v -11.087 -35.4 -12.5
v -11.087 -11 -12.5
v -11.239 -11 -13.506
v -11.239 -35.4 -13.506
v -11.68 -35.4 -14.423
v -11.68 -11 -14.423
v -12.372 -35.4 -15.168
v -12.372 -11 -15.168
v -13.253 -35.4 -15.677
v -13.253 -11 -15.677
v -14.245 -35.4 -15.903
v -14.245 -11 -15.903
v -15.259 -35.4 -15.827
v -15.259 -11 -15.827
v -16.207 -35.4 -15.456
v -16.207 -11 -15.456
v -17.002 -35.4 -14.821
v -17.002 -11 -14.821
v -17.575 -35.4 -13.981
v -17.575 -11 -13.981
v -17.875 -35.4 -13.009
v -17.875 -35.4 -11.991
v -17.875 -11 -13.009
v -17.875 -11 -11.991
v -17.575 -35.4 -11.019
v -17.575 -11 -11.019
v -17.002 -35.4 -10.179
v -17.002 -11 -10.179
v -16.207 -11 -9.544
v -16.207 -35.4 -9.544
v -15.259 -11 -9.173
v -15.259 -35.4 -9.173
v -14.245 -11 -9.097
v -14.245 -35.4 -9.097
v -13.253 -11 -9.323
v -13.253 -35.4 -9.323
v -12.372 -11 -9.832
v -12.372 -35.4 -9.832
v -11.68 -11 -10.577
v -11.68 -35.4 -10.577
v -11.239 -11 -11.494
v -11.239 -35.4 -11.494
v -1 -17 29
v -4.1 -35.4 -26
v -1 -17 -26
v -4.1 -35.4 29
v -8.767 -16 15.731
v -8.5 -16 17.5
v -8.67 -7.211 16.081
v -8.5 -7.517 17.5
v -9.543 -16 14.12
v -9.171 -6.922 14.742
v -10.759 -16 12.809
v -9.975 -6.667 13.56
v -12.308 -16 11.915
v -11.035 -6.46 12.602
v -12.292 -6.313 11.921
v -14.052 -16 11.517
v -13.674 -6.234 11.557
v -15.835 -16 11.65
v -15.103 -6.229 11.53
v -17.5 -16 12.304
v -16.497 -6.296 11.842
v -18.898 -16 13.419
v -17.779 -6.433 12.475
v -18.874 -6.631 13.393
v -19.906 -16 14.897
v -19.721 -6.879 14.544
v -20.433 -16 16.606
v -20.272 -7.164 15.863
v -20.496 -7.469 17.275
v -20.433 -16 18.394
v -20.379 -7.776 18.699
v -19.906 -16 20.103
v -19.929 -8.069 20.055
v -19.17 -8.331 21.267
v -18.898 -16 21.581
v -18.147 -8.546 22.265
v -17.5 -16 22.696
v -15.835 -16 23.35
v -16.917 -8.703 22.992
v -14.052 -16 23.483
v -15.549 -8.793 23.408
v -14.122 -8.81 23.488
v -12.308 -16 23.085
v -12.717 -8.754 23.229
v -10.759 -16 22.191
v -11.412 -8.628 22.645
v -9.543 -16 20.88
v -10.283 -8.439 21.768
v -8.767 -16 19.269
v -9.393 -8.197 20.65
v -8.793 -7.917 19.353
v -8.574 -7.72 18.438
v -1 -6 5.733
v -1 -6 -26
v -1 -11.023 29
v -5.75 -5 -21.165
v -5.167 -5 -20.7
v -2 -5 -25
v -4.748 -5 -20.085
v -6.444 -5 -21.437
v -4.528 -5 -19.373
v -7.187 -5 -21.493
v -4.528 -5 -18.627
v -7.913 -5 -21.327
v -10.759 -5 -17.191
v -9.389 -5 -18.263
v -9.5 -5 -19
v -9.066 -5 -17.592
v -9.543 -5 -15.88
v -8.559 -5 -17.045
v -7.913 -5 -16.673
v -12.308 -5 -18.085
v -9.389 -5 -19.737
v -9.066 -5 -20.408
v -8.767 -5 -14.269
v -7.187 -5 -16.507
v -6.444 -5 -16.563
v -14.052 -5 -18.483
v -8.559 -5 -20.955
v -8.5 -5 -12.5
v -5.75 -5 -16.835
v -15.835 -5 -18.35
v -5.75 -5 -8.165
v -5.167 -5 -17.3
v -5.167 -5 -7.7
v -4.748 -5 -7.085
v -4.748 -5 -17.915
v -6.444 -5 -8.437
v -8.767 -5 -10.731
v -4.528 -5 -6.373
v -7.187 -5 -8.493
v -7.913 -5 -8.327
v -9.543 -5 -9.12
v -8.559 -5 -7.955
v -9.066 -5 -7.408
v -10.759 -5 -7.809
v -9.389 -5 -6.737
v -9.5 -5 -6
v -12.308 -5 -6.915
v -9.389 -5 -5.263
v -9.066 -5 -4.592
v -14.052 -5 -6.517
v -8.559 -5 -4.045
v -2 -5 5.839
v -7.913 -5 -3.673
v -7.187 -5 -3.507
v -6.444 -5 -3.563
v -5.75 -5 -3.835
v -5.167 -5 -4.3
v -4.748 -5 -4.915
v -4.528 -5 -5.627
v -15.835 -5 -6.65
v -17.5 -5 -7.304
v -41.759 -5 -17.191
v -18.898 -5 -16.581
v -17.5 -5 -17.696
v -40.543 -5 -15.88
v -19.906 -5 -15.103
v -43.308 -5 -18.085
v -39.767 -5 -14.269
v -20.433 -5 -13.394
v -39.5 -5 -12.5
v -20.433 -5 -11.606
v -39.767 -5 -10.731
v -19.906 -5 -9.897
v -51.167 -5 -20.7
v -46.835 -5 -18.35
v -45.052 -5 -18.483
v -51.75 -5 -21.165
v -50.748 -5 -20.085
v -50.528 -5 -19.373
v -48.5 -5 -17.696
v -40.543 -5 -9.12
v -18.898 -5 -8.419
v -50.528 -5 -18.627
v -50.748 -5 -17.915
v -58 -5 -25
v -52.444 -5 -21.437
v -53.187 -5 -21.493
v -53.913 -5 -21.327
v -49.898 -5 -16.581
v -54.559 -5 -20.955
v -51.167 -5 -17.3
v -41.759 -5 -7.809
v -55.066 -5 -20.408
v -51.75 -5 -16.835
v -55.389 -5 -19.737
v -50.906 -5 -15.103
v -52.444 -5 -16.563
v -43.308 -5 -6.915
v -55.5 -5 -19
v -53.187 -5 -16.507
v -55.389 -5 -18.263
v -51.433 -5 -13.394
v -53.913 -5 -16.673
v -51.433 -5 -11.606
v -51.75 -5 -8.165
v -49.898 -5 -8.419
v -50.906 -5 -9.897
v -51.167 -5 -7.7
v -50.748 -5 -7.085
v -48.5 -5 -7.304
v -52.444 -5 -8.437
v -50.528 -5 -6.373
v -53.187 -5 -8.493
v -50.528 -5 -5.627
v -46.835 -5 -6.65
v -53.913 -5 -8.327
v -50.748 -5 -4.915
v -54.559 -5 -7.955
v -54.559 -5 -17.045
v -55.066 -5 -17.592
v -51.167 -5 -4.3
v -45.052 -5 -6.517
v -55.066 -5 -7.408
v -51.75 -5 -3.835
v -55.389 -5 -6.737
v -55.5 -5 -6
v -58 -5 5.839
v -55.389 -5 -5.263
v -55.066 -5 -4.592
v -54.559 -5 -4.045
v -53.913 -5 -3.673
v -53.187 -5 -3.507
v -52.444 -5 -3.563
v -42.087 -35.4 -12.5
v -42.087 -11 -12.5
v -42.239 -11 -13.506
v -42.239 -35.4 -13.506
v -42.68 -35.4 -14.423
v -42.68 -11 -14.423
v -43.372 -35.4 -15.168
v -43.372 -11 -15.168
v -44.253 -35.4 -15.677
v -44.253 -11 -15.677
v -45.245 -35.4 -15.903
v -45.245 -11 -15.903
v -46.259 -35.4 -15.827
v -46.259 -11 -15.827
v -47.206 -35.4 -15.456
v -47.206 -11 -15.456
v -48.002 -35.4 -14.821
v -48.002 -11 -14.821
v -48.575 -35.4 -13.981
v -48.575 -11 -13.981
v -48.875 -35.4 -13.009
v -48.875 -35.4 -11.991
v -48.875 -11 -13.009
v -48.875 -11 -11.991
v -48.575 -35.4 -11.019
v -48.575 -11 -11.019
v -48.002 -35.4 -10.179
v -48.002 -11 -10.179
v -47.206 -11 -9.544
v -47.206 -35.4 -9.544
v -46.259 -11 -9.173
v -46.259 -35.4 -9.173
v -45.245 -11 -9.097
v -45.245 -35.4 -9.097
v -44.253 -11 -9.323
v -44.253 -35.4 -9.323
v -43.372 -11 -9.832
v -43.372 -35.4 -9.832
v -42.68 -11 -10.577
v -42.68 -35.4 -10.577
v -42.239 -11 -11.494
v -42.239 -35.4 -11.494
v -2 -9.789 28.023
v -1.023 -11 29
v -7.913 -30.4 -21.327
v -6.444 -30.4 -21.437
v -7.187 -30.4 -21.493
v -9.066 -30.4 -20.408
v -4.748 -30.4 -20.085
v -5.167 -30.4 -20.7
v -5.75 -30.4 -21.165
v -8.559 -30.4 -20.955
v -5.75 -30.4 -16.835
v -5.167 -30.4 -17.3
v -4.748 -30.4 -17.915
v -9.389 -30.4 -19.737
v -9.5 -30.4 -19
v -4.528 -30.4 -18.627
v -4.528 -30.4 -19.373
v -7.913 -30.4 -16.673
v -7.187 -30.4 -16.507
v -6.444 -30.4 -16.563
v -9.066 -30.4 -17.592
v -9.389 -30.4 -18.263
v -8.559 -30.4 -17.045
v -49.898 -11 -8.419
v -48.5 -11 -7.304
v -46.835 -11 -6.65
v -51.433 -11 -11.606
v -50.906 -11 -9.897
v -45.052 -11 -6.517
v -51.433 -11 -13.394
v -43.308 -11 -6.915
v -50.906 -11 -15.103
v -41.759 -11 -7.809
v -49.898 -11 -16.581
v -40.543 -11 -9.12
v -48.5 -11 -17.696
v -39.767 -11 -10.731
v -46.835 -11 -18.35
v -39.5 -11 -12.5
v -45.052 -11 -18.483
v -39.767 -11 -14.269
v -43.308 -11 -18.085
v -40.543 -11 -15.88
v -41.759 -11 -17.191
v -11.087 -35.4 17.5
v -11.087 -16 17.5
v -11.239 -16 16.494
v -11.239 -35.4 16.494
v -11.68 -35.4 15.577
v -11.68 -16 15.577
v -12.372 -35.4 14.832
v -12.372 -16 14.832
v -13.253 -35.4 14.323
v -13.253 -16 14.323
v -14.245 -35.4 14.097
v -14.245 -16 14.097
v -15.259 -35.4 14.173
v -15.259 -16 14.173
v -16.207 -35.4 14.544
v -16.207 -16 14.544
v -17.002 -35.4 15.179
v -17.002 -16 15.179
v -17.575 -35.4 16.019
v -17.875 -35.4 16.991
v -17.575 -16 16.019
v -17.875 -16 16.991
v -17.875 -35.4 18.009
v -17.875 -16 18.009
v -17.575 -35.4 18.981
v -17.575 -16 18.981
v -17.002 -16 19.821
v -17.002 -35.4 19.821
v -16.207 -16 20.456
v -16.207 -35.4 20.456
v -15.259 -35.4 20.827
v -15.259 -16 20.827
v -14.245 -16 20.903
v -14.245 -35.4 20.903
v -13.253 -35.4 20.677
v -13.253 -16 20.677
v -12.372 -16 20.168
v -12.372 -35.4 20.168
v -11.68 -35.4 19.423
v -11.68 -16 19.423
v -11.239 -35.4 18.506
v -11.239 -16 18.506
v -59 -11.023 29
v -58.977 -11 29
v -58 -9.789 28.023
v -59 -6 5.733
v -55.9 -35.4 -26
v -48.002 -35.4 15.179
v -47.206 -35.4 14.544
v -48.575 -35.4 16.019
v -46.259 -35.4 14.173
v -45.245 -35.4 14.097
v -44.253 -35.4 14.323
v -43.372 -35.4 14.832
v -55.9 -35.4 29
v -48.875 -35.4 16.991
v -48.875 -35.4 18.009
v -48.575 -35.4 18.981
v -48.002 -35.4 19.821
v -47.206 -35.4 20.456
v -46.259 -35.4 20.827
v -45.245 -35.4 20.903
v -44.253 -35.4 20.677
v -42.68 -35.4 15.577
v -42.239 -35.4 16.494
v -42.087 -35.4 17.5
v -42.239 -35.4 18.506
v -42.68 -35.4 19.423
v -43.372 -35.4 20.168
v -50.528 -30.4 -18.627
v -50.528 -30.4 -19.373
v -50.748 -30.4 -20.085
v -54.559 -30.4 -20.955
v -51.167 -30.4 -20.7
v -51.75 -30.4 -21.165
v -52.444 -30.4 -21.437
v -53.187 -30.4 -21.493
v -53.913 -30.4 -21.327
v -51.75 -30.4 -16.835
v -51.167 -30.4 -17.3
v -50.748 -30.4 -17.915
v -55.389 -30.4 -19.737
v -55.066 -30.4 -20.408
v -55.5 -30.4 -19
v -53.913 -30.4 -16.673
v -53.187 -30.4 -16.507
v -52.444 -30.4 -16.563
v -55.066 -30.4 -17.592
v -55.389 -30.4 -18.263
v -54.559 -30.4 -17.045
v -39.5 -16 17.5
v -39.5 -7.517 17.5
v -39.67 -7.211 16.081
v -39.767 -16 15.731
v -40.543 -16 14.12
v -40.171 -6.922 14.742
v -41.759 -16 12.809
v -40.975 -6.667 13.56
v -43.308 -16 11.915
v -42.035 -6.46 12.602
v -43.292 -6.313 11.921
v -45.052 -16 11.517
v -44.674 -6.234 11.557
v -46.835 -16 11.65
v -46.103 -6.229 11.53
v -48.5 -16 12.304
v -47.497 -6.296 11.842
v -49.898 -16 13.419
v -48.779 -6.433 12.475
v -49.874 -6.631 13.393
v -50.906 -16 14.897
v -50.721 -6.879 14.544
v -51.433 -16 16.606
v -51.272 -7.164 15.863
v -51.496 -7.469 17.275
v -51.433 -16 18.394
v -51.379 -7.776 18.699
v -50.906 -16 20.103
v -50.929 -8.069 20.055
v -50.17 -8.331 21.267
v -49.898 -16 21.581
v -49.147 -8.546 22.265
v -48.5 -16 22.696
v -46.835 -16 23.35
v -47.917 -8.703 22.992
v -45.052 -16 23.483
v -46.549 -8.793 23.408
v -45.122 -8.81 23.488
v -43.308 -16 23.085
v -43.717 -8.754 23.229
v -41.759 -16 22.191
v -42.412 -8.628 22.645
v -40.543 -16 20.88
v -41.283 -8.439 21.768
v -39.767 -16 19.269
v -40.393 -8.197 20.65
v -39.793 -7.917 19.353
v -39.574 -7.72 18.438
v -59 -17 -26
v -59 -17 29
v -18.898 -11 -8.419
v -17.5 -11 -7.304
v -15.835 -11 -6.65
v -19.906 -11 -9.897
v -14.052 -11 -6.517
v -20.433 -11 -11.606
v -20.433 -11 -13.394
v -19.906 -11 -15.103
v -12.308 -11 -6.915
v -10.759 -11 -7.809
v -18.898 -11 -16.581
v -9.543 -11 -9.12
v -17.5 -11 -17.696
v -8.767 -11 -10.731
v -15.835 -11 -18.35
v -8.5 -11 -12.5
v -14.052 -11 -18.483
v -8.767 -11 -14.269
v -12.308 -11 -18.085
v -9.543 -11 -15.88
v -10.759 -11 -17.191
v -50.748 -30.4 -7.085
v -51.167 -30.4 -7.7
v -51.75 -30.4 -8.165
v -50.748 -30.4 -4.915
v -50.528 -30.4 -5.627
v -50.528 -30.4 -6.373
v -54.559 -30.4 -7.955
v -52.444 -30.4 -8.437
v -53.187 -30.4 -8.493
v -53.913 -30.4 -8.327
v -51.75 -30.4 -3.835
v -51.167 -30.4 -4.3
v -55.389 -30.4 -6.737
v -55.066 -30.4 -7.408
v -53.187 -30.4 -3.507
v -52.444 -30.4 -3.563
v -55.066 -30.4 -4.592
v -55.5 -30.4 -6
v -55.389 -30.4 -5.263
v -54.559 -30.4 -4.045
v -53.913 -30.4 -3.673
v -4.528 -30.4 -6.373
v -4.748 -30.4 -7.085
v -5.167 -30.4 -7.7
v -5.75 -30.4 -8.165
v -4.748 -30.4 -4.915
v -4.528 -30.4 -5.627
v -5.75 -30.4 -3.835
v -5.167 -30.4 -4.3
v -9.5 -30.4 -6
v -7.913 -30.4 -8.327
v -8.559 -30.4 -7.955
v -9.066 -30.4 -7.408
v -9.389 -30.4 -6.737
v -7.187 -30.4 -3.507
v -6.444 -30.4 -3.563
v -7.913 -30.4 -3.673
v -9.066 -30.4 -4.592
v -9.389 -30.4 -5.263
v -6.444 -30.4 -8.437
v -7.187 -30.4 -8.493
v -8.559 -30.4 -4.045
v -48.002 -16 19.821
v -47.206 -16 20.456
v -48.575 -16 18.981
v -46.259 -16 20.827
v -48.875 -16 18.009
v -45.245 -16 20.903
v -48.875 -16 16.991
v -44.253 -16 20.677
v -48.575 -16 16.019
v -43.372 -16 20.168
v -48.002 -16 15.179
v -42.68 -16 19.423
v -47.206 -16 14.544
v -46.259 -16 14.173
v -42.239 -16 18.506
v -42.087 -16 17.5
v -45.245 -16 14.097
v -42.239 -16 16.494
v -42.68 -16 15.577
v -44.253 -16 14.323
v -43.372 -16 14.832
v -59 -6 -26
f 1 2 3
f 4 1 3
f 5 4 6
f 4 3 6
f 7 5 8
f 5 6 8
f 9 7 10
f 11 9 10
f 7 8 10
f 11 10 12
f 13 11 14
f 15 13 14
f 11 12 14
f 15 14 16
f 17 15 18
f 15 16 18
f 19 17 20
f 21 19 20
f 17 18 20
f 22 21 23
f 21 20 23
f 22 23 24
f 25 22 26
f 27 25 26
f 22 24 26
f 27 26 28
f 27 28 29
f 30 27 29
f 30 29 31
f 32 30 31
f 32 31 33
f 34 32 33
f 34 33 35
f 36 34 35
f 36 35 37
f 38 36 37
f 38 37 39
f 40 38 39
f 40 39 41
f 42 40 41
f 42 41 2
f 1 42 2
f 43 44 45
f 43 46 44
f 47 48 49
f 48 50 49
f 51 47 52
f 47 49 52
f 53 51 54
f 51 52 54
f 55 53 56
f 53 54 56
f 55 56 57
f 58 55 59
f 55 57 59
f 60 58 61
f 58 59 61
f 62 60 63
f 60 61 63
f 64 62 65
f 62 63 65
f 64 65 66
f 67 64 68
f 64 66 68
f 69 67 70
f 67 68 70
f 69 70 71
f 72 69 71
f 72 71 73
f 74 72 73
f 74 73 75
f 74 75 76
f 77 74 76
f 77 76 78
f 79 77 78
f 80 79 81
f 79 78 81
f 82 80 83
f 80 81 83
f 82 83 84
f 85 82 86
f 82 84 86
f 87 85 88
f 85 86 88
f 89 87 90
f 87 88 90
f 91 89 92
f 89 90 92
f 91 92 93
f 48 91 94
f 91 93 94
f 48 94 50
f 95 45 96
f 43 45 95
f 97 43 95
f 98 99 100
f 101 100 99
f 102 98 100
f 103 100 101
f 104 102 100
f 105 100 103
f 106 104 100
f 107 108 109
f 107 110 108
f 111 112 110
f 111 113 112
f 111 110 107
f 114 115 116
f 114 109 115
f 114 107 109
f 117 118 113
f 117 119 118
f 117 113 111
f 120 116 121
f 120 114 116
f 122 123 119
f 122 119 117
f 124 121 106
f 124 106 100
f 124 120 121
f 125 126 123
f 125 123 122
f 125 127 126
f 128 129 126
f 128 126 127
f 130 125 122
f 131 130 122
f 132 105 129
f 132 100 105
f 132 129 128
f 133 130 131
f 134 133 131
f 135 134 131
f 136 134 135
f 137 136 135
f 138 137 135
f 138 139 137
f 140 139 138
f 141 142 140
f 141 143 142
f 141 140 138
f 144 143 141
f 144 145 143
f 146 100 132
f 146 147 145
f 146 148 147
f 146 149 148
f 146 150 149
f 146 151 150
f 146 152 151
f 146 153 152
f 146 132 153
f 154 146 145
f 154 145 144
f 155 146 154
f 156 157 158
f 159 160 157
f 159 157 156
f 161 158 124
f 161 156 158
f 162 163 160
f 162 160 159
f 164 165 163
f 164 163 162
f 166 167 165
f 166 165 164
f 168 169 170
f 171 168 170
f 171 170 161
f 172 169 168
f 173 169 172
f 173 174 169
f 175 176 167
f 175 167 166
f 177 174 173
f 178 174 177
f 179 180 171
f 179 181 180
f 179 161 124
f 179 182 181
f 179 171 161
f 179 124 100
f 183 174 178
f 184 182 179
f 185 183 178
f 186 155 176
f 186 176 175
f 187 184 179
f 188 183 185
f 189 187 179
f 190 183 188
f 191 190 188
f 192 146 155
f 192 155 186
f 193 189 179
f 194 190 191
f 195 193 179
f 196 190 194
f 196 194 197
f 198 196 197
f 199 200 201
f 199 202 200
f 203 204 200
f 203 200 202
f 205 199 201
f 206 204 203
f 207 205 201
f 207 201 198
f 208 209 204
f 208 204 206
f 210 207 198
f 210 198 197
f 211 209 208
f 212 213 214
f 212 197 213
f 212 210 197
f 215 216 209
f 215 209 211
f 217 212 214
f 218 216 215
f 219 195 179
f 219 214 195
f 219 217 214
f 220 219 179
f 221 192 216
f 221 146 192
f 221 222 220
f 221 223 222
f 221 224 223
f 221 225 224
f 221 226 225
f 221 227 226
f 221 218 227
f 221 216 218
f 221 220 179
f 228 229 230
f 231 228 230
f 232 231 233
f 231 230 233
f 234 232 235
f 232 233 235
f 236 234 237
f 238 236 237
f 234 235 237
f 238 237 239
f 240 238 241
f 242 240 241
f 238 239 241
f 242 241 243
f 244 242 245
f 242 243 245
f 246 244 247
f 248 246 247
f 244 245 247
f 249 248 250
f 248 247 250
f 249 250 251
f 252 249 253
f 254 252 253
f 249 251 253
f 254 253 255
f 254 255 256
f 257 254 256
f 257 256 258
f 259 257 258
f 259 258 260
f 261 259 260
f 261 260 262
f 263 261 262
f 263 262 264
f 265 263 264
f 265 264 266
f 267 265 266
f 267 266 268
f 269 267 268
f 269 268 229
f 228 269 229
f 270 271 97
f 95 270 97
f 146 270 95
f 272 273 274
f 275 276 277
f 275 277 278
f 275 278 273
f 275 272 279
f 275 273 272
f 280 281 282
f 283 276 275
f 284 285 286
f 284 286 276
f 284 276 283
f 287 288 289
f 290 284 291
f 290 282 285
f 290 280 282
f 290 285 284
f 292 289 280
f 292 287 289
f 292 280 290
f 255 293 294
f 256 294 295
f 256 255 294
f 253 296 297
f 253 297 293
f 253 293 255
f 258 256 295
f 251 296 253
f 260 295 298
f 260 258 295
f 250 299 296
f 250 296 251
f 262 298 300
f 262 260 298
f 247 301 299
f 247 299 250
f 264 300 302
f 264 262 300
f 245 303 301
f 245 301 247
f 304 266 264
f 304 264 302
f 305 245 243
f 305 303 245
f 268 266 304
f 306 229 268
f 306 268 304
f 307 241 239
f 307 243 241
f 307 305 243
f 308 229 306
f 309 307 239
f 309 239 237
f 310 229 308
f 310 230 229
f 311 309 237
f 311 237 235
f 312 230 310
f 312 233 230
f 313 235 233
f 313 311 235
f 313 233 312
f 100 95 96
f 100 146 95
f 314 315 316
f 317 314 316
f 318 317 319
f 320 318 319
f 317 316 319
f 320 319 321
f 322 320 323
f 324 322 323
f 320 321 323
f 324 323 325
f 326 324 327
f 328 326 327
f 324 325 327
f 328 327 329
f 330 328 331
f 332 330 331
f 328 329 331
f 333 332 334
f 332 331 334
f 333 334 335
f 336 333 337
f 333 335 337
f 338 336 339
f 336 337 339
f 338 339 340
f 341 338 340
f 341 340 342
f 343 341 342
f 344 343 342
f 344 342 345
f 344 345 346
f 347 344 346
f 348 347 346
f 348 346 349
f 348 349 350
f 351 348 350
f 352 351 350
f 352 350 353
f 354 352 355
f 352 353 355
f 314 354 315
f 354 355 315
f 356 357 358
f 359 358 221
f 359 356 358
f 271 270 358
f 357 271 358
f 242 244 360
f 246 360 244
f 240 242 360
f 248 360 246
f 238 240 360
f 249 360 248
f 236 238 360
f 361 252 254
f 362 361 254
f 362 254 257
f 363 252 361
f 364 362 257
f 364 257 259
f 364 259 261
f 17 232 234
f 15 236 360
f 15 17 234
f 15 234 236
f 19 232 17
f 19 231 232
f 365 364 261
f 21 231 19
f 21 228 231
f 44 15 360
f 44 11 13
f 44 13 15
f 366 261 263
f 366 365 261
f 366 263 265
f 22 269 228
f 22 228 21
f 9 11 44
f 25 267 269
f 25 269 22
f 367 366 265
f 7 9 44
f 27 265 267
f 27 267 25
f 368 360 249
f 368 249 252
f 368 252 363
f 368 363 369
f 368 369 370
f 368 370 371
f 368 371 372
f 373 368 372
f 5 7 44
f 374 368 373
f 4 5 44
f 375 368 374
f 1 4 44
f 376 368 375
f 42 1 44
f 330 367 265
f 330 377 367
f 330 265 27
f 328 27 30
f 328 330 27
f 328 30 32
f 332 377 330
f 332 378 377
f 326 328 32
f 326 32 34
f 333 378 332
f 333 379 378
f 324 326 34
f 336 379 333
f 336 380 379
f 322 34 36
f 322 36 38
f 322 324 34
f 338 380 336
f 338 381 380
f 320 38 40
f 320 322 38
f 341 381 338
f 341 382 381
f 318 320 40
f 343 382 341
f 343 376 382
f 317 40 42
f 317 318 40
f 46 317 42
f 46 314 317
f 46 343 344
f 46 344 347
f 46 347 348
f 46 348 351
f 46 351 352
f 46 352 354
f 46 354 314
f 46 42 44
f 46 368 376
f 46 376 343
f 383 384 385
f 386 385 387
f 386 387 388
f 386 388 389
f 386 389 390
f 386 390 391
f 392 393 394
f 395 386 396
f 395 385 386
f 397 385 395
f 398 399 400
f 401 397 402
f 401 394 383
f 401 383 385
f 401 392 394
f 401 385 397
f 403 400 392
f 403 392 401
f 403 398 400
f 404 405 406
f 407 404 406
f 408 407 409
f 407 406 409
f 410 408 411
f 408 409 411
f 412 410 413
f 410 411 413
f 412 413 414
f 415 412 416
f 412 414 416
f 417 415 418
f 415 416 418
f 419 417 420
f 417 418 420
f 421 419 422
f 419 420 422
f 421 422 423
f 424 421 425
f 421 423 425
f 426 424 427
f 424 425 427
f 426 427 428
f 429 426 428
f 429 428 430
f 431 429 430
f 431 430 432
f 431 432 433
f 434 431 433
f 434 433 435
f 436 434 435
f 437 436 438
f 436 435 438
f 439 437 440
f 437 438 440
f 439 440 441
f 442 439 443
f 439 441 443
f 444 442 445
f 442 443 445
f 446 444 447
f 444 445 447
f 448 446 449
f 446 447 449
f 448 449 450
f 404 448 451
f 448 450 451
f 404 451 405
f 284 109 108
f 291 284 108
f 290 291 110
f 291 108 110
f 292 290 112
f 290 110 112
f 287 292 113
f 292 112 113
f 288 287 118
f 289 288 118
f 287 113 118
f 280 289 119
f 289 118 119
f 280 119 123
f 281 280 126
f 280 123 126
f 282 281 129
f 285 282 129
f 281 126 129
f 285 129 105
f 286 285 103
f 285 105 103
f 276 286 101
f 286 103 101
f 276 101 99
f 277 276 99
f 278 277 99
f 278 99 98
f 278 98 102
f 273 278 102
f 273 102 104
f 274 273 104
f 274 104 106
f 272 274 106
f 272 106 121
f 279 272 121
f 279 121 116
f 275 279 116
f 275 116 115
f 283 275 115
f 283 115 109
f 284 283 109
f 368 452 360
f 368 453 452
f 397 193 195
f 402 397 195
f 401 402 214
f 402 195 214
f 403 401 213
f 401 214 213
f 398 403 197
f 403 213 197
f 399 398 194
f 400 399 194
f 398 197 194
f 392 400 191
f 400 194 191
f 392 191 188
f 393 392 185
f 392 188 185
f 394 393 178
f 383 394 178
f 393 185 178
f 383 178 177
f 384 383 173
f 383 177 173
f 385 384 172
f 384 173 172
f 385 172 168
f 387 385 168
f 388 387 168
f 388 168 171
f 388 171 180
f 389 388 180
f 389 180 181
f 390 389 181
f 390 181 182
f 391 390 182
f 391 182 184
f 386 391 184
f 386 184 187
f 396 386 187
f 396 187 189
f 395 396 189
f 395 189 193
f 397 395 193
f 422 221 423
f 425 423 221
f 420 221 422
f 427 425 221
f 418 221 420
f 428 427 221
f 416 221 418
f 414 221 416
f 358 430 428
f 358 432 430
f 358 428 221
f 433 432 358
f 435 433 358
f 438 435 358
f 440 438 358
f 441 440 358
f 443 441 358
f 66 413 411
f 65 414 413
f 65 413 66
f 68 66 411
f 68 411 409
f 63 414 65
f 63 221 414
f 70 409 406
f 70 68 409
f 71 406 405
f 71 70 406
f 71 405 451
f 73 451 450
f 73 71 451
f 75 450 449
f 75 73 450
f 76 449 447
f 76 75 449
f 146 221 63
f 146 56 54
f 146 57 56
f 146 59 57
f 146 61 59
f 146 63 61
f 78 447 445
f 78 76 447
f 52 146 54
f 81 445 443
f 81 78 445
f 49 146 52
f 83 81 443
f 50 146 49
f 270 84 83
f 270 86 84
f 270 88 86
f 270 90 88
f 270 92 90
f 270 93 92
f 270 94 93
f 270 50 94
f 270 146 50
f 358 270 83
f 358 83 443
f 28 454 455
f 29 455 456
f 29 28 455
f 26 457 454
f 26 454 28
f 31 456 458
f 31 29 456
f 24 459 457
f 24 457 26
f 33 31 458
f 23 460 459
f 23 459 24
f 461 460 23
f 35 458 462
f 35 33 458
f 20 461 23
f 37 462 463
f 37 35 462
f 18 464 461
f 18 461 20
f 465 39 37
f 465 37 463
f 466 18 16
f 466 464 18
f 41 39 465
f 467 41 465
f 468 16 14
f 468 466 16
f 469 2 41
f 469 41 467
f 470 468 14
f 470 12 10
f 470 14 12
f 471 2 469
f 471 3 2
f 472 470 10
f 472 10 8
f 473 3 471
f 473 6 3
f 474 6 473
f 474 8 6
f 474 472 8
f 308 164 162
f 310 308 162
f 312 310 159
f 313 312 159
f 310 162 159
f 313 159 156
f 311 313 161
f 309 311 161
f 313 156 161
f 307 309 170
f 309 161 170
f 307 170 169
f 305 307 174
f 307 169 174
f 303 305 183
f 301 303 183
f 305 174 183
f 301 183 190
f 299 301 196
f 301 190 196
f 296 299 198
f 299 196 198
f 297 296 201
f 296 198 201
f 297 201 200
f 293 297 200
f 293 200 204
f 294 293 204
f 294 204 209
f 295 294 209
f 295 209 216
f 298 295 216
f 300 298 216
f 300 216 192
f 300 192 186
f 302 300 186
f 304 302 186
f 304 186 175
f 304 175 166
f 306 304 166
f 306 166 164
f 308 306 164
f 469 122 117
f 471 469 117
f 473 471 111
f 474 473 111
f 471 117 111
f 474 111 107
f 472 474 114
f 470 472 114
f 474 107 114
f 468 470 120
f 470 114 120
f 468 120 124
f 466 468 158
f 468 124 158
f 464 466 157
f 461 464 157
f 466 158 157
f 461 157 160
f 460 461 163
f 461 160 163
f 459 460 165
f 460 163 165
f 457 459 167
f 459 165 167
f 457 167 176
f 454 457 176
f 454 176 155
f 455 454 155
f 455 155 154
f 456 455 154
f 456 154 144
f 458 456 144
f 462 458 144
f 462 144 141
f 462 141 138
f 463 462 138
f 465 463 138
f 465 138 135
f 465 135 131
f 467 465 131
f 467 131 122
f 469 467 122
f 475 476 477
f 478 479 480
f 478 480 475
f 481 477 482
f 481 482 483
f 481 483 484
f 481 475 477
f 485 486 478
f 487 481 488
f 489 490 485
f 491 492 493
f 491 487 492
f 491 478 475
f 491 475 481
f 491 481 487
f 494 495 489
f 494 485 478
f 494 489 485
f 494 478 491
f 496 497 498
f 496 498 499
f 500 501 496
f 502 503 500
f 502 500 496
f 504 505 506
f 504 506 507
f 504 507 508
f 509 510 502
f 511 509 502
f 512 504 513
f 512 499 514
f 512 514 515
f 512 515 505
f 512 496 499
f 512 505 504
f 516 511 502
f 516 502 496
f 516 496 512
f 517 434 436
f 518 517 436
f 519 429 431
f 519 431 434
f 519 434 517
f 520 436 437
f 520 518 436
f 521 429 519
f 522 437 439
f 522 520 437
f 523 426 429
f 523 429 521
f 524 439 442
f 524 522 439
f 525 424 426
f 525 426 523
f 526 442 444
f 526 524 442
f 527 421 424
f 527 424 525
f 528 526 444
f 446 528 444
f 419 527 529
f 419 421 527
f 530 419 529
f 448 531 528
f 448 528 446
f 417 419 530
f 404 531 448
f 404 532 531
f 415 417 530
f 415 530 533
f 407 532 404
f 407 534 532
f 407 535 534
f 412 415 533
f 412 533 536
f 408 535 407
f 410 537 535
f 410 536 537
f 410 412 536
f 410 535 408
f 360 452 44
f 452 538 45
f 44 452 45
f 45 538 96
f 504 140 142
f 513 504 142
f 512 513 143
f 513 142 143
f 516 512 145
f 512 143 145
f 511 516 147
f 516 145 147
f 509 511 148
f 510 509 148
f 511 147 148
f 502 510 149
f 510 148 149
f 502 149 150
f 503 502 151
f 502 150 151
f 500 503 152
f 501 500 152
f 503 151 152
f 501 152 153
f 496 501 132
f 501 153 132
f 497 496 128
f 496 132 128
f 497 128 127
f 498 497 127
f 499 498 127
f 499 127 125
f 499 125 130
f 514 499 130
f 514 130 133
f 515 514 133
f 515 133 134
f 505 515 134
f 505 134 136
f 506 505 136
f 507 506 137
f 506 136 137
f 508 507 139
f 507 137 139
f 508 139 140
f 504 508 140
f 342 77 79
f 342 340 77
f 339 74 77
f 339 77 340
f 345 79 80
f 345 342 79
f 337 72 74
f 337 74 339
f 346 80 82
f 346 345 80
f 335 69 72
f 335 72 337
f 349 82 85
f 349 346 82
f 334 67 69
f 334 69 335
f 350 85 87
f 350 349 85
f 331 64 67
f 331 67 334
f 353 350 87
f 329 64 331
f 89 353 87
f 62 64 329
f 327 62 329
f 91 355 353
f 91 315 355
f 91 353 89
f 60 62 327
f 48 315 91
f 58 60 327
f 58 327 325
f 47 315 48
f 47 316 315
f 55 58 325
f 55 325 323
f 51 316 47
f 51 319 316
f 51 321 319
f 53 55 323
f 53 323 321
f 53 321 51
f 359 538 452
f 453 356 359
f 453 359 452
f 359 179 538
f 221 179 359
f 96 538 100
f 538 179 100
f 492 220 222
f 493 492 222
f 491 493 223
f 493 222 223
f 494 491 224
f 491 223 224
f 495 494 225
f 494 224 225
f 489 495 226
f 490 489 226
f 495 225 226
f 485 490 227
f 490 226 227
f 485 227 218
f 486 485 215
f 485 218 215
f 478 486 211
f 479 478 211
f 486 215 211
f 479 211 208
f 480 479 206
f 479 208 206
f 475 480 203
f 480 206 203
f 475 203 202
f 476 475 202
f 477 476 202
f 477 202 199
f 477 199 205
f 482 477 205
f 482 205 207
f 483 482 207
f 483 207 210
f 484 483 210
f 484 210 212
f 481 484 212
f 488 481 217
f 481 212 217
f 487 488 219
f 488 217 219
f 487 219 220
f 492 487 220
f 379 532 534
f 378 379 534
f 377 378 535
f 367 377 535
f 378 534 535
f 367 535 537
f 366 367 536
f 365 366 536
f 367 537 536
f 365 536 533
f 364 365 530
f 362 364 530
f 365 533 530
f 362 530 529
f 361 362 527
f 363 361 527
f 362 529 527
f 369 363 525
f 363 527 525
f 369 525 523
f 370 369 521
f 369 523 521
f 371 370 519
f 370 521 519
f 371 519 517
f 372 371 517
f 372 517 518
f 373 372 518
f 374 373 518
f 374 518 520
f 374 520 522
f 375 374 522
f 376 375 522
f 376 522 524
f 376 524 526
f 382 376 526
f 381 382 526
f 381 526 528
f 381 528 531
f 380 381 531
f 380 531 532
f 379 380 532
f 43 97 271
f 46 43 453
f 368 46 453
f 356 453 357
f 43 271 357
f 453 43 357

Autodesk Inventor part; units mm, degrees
ref_plane "YZ Plane" through (0, 0, 0) normal (1, 0, 0) x (0, 1, 0)
ref_plane "XZ Plane" through (0, 0, 0) normal (0, 1, 0) x (-1, 0, 0)
ref_plane "XY Plane" through (0, 0, 0) normal (0, 0, 1) x (1, 0, 0)
sketch "Sketch1" plane through (0, 0, 0) normal (0, 1, 0) x (-1, 0, 0)
  line L0 (0, 0) -> (60, 0) construction
  line L1 (60, 0) -> (60, -25) construction
  line L2 (60, -25) -> (0, -25) construction
  line L3 (0, -25) -> (0, 0) construction
  line L4 (60.5, 0.5) -> (-0.5, 0.5)
  line L5 (-0.5, 0.5) -> (-0.5, -25.5)
  line L6 (-0.5, -25.5) -> (60.5, -25.5)
  line L7 (60.5, -25.5) -> (60.5, 0.5)
  circle A0 centre (53, -19) radius 2.5
  circle A1 centre (7, -19) radius 2.5
  circle A2 centre (7, -6) radius 2.5
  circle A3 centre (53, -6) radius 2.5
  line L8 (53, -19) -> (7, -19) construction
  line L9 (7, -19) -> (7, -6) construction
  line L10 (60.5, 0.5) -> (60.5, 20.5)
  line L11 (60.5, 20.5) -> (-0.5, 20.5)
  line L12 (-0.5, 20.5) -> (-0.5, 0)
  line L13 (89.6876, -43.5705) -> (-21.1545, -43.5705)
  line L14 (-21.1545, -43.5705) -> (-21.1545, 42.1657)
  line L15 (-21.1545, 42.1657) -> (89.6876, 42.1657)
  line L16 (89.6876, 42.1657) -> (89.6876, -43.5705)
  point P0 (30, -19)
  point P1 (30, -25)
  point P2 (7, -12.5)
  point P3 (0, -12.5)
  point P4 (-0.5, 0.5)
  point P5 (-0.5, 0.5)
  dimension "d0" = 25
  dimension "d1" = 60
  dimension "d2" = 0.5
  dimension "d3" = 0.5
  dimension "d4" = 0.5
  dimension "d5" = 0.5
  dimension "d6" = 5
  dimension "d7" = 46
  dimension "d8" = 13
  dimension "d72" = 20
sketch "Sketch2" plane through (0, 0, 0) normal (0, 1, 0) x (-1, 0, 0)
  line L0 (-5.4, 29) -> (65.4, 29)
  line L1 (65.4, 29) -> (65.4, -26)
  line L2 (65.4, -26) -> (-5.4, -26)
  line L3 (-5.4, -26) -> (-5.4, 29)
  line L4 (60.5, -25.5) -> (60.5, 0.5) construction
  line L5 (-0.5, 0.5) -> (-0.5, -25.5) construction
  line L6 (-0.5, -25.5) -> (60.5, -25.5) construction
  point P0 (0, 0)
  point P1 (60.5, -12.5)
  point P2 (65.4, 1.5)
  point P3 (30, -26)
  point P4 (30, -25.5)
  point P5 (30, -53.5)
  point P6 (110, 1.5)
  dimension "d9" = 70.8
  dimension "d10" = 55
  dimension "d50" = 35.4
  dimension "d74" = 13.5
extrude "Extrusion1" add sketch "Sketch2" against normal blind 35.4
extrude "Extrusion2" cut sketch "Sketch1" along normal blind 10 and the other way blind 5 contours L7 L6 L5 L4 | L4 L12 L11 L10 | L13 L14 L15 L16
extrude "Extrusion3" cut sketch "Sketch1" along normal blind 10 and the other way blind 30.4 contours A0 | A1 | A2 | A3
sketch "Sketch3" plane through (5.4, -35.4, -26) normal (0, 0, -1) x (1, 0, 0)
  line L0 (-70.8, 0) -> (-70.8, 17.5)
  line L1 (-70.8, 17.5) -> (-61.3, 17.5)
  line L2 (-61.3, 17.5) -> (-61.3, 3.175)
  line L3 (0, 0) -> (0, 17.5)
  line L4 (0, 17.5) -> (-9.5, 17.5)
  line L5 (-9.5, 17.5) -> (-9.5, 3.175)
  arc A0 (-61.3, 3.175) -> (-58.125, 0) centre (-58.125, 3.175) ccw
  arc A1 (-12.675, 0) -> (-9.5, 3.175) centre (-12.675, 3.175) ccw
  line L6 (0, 0) -> (-12.675, 0)
  line L7 (-70.8, -35.4) -> (-70.8, 0) projected
  line L8 (-70.8, 0) -> (0, 0) projected
  line L9 (-58.125, 0) -> (-70.8, 0)
  point P0 (-61.3, 0)
  dimension "d67" = 3.175
  dimension "d68" = 9.5
  dimension "d69" = 17.5
  dimension "d70" = 90
  dimension "d71" = 90
extrude "Extrusion4" add sketch "Sketch3" against normal up to surface (55 mm away)
sketch "Sketch4" plane through (0, -5, 0) normal (0, 1, 0) x (1, 0, 0)
  circle A0 centre (-45.5, -17.5) radius 3.413
  circle A1 centre (-14.5, -17.5) radius 3.413
  line L0 (-45.5, -17.5) -> (-14.5, -17.5) construction
  line L1 (-65.4, 26) -> (5.4, 26) projected
  line L2 (-45.5, -17.5) -> (-45.5, 12.5) construction
  line L3 (-45.5, 12.5) -> (-14.5, 12.5) construction
  line L4 (-14.5, 12.5) -> (-14.5, -17.5) construction
  circle A2 centre (-45.5, 12.5) radius 3.413
  circle A3 centre (-14.5, 12.5) radius 3.413
  point P0 (-30, -17.5)
  point P1 (-30, 26)
  dimension "d29" = 6.826
  dimension "d78" = 30
  dimension "d79" = 31
  dimension "d80" = 13.5
extrude "Extrusion5" cut sketch "Sketch4" against normal blind 36.5125
sketch "Sketch5" plane through (0, -5, 0) normal (0, 1, 0) x (1, 0, 0)
  circle A0 centre (-45.5, -17.5) radius 3.413 construction
  circle A1 centre (-14.5, -17.5) radius 3.413 construction
  circle A2 centre (-14.5, -17.5) radius 6
  circle A3 centre (-45.5, -17.5) radius 6
  circle A4 centre (-45.5, 12.5) radius 6
  circle A5 centre (-14.5, 12.5) radius 6
  circle A6 centre (-14.5, 12.5) radius 3.413 projected
  circle A7 centre (-45.5, 12.5) radius 3.413 projected
  point P0 (0, 0)
  point P1 (-43.1765, -26)
  point P2 (-47.8235, -26)
  point P3 (-12.1765, -26)
  point P4 (-16.8235, -26)
  dimension "d34" = 12
extrude "Extrusion6" cut sketch "Sketch5" against normal blind 6 contours A2 | A3 | A4 | A5 | A6
sketch "Sketch8" plane through (-52.725, -35.4, 29) normal (0, 0, 1) x (-1, 0, 0)
  line L0 (-22.725, 0) -> (-13.725, 0)
  line L1 (-13.725, 0) -> (-12.725, 1)
  line L2 (-12.725, 1) -> (-12.725, 4)
  line L3 (-12.725, 4) -> (-16.175, 7.45)
  line L4 (-16.175, 7.45) -> (-16.175, 9.8767)
  line L5 (-16.175, 9.8767) -> (-14.9578, 11.0939)
  arc A0 (-13.2458, 12.8058) -> (-14.9578, 11.0939) centre (-12.9761, 10.8241) ccw
  line L6 (-13.2458, 12.8058) -> (-12.725, 13.3267)
  line L7 (-12.725, 13.3267) -> (-12.725, 14.66)
  line L8 (-12.725, 14.66) -> (-13.2458, 15.1808)
  arc A1 (-14.9578, 16.8928) -> (-13.2458, 15.1808) centre (-12.9761, 17.1626) ccw
  line L9 (-14.9578, 16.8928) -> (-15.565, 17.5)
  line L10 (-15.565, 17.5) -> (-22.725, 17.5)
  line L11 (-22.725, 17.5) -> (-22.725, 0) construction
  line L12 (-14.9578, 11.0939) -> (-13.2458, 12.8058) construction
  line L13 (-14.9578, 16.8928) -> (-13.2458, 15.1808) construction
  line L14 (-29.275, 7.45) -> (-29.275, 9.8767)
  line L15 (-29.275, 9.8767) -> (-30.4922, 11.0939)
  line L16 (-30.4922, 11.0939) -> (-32.2042, 12.8058) construction
  arc A2 (-30.4922, 11.0939) -> (-32.2042, 12.8058) centre (-32.4739, 10.8241) ccw
  line L17 (-32.2042, 12.8058) -> (-32.725, 13.3267)
  line L18 (-32.725, 13.3267) -> (-32.725, 14.66)
  line L19 (-32.725, 14.66) -> (-32.2042, 15.1808)
  line L20 (-30.4922, 16.8928) -> (-32.2042, 15.1808) construction
  arc A3 (-32.2042, 15.1808) -> (-30.4922, 16.8928) centre (-32.4739, 17.1626) ccw
  line L21 (-29.885, 17.5) -> (-22.725, 17.5)
  line L22 (-30.4922, 16.8928) -> (-29.885, 17.5)
  line L23 (-32.725, 4) -> (-29.275, 7.45)
  line L24 (-22.725, 0) -> (-31.725, 0)
  line L25 (-32.725, 1) -> (-32.725, 4)
  line L26 (-31.725, 0) -> (-32.725, 1)
  line L27 (-13.725, 0) -> (-12.725, 0)
  line L28 (-12.725, 1) -> (-12.725, 0)
  line L29 (-32.725, 1) -> (-32.725, 0)
  line L30 (-32.725, 0) -> (-31.725, 0)
  line L31 (-13.725, 0) -> (-12.725, -1)
  line L32 (-12.725, -1) -> (-12.725, -4)
  line L33 (-16.175, -7.45) -> (-16.175, -9.8767)
  line L34 (-12.725, -4) -> (-16.175, -7.45)
  line L35 (-12.725, -1) -> (-12.725, 0)
  line L36 (-31.725, 0) -> (-32.725, -1)
  line L37 (-32.725, -4) -> (-29.275, -7.45)
  line L38 (-32.2042, -12.8058) -> (-32.725, -13.3267)
  line L39 (-32.725, -13.3267) -> (-32.725, -14.66)
  line L40 (-29.275, -7.45) -> (-29.275, -9.8767)
  line L41 (-32.725, -14.66) -> (-32.2042, -15.1808)
  line L42 (-30.4922, -11.0939) -> (-32.2042, -12.8058) construction
  arc A4 (-32.2042, -12.8058) -> (-30.4922, -11.0939) centre (-32.4739, -10.8241) ccw
  line L43 (-29.275, -9.8767) -> (-30.4922, -11.0939)
  line L44 (-30.4922, -16.8928) -> (-32.2042, -15.1808) construction
  arc A5 (-30.4922, -16.8928) -> (-32.2042, -15.1808) centre (-32.4739, -17.1626) ccw
  line L45 (-30.4922, -16.8928) -> (-29.885, -17.5)
  line L46 (-29.885, -17.5) -> (-22.725, -17.5)
  line L47 (-22.725, -17.5) -> (-22.725, 0) construction
  line L48 (-32.725, -1) -> (-32.725, 0)
  line L49 (-32.725, -1) -> (-32.725, -4)
  line L50 (-16.175, -9.8767) -> (-14.9578, -11.0939)
  line L51 (-14.9578, -11.0939) -> (-13.2458, -12.8058) construction
  arc A6 (-14.9578, -11.0939) -> (-13.2458, -12.8058) centre (-12.9761, -10.8241) ccw
  line L52 (-13.2458, -12.8058) -> (-12.725, -13.3267)
  line L53 (-12.725, -13.3267) -> (-12.725, -14.66)
  line L54 (-12.725, -14.66) -> (-13.2458, -15.1808)
  line L55 (-15.565, -17.5) -> (-22.725, -17.5)
  line L56 (-14.9578, -16.8928) -> (-13.2458, -15.1808) construction
  arc A7 (-13.2458, -15.1808) -> (-14.9578, -16.8928) centre (-12.9761, -17.1626) ccw
  line L57 (-14.9578, -16.8928) -> (-15.565, -17.5)
  line L58 (-45.45, 0) -> (0, 0) projected
  point P0 (-52.725, -35.4)
  point P1 (-12.725, 2.5)
  point P2 (-32.725, 0.5)
  point P3 (-12.725, -2.5)
  point P4 (-32.725, -0.5)
  dimension "d51" = 1
  dimension "d52" = 3
  dimension "d53" = 135
  dimension "d54" = 2
  dimension "d55" = 3.45
  dimension "d56" = 17.5
  dimension "d57" = 7.16
  dimension "d58" = 2.375
  dimension "d59" = 1.3333
  dimension "d60" = 2.4211
  dimension "d61" = 10
extrude "Extrusion9" cut sketch "Sketch8" against normal up to surface (55 mm away) contours L0 L31 L32 L34 L33 L50 A6 L52 L53 L54 A7 L57 L55 L46 L45 A5 L41 L39 L38 A4 L43 L40 L37 L49 L36 L24 | L27 L35 L31 | L36 L48 L30
sketch "Sketch10" plane through (-65.4, -5, 29) normal (0, 0, 1) x (1, 0, 0)
  arc A0 (12.675, -30.4) -> (9.5, -33.575) centre (12.675, -33.575) ccw projected
  line L0 (0, 0) -> (0, -47.9) projected
  line L1 (70.8, 0) -> (0, 0) projected
  line L2 (9.5, -33.575) -> (9.5, -30.4)
  line L3 (9.5, -30.4) -> (12.675, -30.4)
  line L4 (9.5, -47.9) -> (0, -47.9) projected
  line L5 (0, -47.9) -> (9.5, -47.9)
  line L6 (9.5, -47.9) -> (9.5, -33.575)
  line L7 (44.9, -6) -> (56.9, -6) projected
  line L8 (45.4, -26.4) -> (45.4, -30.4) projected
  line L9 (58.125, -30.4) -> (45.4, -30.4) projected
  arc A1 (61.3, -33.575) -> (58.125, -30.4) centre (58.125, -33.575) ccw projected
  line L10 (61.3, -47.9) -> (61.3, -33.575) projected
  line L11 (70.8, -47.9) -> (61.3, -47.9) projected
  line L12 (70.8, 0) -> (70.8, -47.9) projected
  line L13 (70.8, 0) -> (0, 0) projected
  line L14 (0, 0) -> (0, -47.9) projected
  line L15 (9.5, -47.9) -> (0, -47.9) projected
  line L16 (9.5, -33.575) -> (9.5, -47.9) projected
  arc A2 (12.675, -30.4) -> (9.5, -33.575) centre (12.675, -33.575) ccw projected
  line L17 (25.4, -30.4) -> (12.675, -30.4) projected
  line L18 (25.4, -30.4) -> (25.4, -26.4) projected
  line L19 (25.4, -26.4) -> (28.85, -22.95) projected
  line L20 (28.85, -22.95) -> (28.85, -20.5233) projected
  line L21 (28.85, -20.5233) -> (27.6328, -19.3061) projected
  arc A3 (27.6328, -19.3061) -> (25.9208, -17.5942) centre (25.6511, -19.5759) ccw projected
  line L22 (25.9208, -17.5942) -> (25.4, -17.0733) projected
  line L23 (25.4, -17.0733) -> (25.4, -15.74) projected
  line L24 (25.4, -15.74) -> (25.9208, -15.2192) projected
  arc A4 (25.9208, -15.2192) -> (27.6328, -13.5072) centre (25.6511, -13.2374) ccw projected
  line L25 (27.6328, -13.5072) -> (28.24, -12.9) projected
  line L26 (28.24, -12.9) -> (42.56, -12.9) projected
  line L27 (42.56, -12.9) -> (43.1672, -13.5072) projected
  arc A5 (43.1672, -13.5072) -> (44.8792, -15.2192) centre (45.1489, -13.2374) ccw projected
  line L28 (44.8792, -15.2192) -> (45.4, -15.74) projected
  line L29 (45.4, -15.74) -> (45.4, -17.0733) projected
  line L30 (45.4, -17.0733) -> (44.8792, -17.5942) projected
  arc A6 (44.8792, -17.5942) -> (43.1672, -19.3061) centre (45.1489, -19.5759) ccw projected
  line L31 (43.1672, -19.3061) -> (41.95, -20.5233) projected
  line L32 (41.95, -20.5233) -> (41.95, -22.95) projected
  line L33 (41.95, -22.95) -> (45.4, -26.4) projected
  line L34 (58.125, -30.4) -> (61.3, -30.4)
  line L35 (61.3, -30.4) -> (61.3, -33.575)
  line L36 (9.5, -30.4) -> (6.4, 0)
  line L37 (0, 0) -> (70.8, 0) projected
  line L38 (61.3, -30.4) -> (64.4, 0)
  line L39 (6.4, 0) -> (6.4, -12)
  line L40 (6.4, -12) -> (9.5, -30.4)
  line L41 (61.3, -30.4) -> (64.4, -12)
  line L42 (64.4, -12) -> (64.4, 0)
  point P0 (65.4, 5)
  point P1 (64.4, 0)
  point P2 (6.4, 0)
  point P3 (6.4, 0)
  point P4 (64.4, 0)
  dimension "d86" = 58
  dimension "d101" = 12
extrude "Extrusion10" cut sketch "Sketch10" against normal through all contours A0 L2 L3 | L6 L4 L0 L1 L39 L40 L2 | L1 L12 L11 L10 L35 L41 L42 | L35 A1 L34
sketch "Sketch11" plane through (-37.16, -17.9, 29) normal (0, 0, 1) x (1, 0, 0)
  line L0 (-18.74, -17.5) -> (-2.84, -17.5) projected
  line L1 (-3.04, -17.5) -> (17.36, -17.5)
  line L2 (17.36, -17.5) -> (17.36, 0.1)
  line L3 (17.36, 0.1) -> (-3.04, 0.1)
  line L4 (-3.04, 0.1) -> (-3.04, -17.5)
  line L5 (-2.84, -17.5) -> (-2.84, -13.5) projected
  line L6 (17.16, -13.5) -> (17.16, -17.5) projected
  line L7 (0, 0) -> (14.32, 0) projected
  point P0 (37.16, 17.9)
  point P1 (-16.7296, -17.5)
  point P2 (-2.84, -15.5)
  dimension "d88" = 0.2
  dimension "d89" = 0.2
  dimension "d90" = 0.1
extrude "Extrusion11" add sketch "Sketch11" against normal up to surface (55 mm away)
sketch "Sketch12" plane through (0, 0, 0) normal (1, 0, 0) x (0, 1, 0)
  line L0 (-5, 5.8394) -> (-10, 29)
  line L1 (-35.4, 29) -> (-5, 29) projected
  line L2 (-5, 29) -> (-5, -26) projected
  point P0 (0, 0)
  dimension "d93" = 5
extrude "Extrusion12" cut sketch "Sketch12" against normal through all
sketch "Sketch13" plane through (-14.5, -11, 17.5) normal (0, 1, 0) x (1, 0, 0)
  circle A0 centre (0, 0) radius 3.413 projected
  circle A1 centre (0, 0) radius 6 projected
  circle A2 centre (-31, 0) radius 3.413 projected
  circle A3 centre (-31, 0) radius 3.413 projected
  circle A4 centre (-31, 0) radius 6 projected
  point P0 (14.5, 17.5)
extrude "Extrusion13" cut sketch "Sketch13" against normal blind 5
chamfer "Chamfer2" distance 1 angle 45 6 edges at (-30, -10, 29) (-30, -5, -26) (-1, -7.5, 17.4197) (-59, -7.5, 17.4197) (-59, -5, -10.0803) (-1, -5, -10.0803)
properties part number "BK12_Spacer_Metal"
